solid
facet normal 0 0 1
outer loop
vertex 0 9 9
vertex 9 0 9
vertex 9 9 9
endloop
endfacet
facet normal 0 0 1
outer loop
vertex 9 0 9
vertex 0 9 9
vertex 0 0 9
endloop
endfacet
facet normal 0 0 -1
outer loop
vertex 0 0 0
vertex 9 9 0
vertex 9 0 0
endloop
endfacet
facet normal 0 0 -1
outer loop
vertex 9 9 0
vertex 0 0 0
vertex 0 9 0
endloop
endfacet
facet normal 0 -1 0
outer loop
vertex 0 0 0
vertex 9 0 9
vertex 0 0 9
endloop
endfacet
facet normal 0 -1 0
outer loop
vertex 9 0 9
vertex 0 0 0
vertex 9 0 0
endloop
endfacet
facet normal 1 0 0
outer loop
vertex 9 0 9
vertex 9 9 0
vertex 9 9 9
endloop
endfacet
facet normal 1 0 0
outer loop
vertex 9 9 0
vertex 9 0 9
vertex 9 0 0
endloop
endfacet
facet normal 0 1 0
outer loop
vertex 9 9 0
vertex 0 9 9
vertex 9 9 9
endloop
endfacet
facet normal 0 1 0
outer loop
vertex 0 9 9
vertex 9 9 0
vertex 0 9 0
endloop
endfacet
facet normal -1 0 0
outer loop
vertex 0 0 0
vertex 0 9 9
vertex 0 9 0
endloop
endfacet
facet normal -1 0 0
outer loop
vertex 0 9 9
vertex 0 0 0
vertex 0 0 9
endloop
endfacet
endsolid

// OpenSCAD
//
// Model under its own terms.
//
// License: vendor
// Example License
//
// Permission is granted to do anything.

/* [Hidden] */

// onescad: vendor/lib.scad
// Vendored helper.

function sq(x) = x * x;

// onescad: main.scad

cube(sq(3));
